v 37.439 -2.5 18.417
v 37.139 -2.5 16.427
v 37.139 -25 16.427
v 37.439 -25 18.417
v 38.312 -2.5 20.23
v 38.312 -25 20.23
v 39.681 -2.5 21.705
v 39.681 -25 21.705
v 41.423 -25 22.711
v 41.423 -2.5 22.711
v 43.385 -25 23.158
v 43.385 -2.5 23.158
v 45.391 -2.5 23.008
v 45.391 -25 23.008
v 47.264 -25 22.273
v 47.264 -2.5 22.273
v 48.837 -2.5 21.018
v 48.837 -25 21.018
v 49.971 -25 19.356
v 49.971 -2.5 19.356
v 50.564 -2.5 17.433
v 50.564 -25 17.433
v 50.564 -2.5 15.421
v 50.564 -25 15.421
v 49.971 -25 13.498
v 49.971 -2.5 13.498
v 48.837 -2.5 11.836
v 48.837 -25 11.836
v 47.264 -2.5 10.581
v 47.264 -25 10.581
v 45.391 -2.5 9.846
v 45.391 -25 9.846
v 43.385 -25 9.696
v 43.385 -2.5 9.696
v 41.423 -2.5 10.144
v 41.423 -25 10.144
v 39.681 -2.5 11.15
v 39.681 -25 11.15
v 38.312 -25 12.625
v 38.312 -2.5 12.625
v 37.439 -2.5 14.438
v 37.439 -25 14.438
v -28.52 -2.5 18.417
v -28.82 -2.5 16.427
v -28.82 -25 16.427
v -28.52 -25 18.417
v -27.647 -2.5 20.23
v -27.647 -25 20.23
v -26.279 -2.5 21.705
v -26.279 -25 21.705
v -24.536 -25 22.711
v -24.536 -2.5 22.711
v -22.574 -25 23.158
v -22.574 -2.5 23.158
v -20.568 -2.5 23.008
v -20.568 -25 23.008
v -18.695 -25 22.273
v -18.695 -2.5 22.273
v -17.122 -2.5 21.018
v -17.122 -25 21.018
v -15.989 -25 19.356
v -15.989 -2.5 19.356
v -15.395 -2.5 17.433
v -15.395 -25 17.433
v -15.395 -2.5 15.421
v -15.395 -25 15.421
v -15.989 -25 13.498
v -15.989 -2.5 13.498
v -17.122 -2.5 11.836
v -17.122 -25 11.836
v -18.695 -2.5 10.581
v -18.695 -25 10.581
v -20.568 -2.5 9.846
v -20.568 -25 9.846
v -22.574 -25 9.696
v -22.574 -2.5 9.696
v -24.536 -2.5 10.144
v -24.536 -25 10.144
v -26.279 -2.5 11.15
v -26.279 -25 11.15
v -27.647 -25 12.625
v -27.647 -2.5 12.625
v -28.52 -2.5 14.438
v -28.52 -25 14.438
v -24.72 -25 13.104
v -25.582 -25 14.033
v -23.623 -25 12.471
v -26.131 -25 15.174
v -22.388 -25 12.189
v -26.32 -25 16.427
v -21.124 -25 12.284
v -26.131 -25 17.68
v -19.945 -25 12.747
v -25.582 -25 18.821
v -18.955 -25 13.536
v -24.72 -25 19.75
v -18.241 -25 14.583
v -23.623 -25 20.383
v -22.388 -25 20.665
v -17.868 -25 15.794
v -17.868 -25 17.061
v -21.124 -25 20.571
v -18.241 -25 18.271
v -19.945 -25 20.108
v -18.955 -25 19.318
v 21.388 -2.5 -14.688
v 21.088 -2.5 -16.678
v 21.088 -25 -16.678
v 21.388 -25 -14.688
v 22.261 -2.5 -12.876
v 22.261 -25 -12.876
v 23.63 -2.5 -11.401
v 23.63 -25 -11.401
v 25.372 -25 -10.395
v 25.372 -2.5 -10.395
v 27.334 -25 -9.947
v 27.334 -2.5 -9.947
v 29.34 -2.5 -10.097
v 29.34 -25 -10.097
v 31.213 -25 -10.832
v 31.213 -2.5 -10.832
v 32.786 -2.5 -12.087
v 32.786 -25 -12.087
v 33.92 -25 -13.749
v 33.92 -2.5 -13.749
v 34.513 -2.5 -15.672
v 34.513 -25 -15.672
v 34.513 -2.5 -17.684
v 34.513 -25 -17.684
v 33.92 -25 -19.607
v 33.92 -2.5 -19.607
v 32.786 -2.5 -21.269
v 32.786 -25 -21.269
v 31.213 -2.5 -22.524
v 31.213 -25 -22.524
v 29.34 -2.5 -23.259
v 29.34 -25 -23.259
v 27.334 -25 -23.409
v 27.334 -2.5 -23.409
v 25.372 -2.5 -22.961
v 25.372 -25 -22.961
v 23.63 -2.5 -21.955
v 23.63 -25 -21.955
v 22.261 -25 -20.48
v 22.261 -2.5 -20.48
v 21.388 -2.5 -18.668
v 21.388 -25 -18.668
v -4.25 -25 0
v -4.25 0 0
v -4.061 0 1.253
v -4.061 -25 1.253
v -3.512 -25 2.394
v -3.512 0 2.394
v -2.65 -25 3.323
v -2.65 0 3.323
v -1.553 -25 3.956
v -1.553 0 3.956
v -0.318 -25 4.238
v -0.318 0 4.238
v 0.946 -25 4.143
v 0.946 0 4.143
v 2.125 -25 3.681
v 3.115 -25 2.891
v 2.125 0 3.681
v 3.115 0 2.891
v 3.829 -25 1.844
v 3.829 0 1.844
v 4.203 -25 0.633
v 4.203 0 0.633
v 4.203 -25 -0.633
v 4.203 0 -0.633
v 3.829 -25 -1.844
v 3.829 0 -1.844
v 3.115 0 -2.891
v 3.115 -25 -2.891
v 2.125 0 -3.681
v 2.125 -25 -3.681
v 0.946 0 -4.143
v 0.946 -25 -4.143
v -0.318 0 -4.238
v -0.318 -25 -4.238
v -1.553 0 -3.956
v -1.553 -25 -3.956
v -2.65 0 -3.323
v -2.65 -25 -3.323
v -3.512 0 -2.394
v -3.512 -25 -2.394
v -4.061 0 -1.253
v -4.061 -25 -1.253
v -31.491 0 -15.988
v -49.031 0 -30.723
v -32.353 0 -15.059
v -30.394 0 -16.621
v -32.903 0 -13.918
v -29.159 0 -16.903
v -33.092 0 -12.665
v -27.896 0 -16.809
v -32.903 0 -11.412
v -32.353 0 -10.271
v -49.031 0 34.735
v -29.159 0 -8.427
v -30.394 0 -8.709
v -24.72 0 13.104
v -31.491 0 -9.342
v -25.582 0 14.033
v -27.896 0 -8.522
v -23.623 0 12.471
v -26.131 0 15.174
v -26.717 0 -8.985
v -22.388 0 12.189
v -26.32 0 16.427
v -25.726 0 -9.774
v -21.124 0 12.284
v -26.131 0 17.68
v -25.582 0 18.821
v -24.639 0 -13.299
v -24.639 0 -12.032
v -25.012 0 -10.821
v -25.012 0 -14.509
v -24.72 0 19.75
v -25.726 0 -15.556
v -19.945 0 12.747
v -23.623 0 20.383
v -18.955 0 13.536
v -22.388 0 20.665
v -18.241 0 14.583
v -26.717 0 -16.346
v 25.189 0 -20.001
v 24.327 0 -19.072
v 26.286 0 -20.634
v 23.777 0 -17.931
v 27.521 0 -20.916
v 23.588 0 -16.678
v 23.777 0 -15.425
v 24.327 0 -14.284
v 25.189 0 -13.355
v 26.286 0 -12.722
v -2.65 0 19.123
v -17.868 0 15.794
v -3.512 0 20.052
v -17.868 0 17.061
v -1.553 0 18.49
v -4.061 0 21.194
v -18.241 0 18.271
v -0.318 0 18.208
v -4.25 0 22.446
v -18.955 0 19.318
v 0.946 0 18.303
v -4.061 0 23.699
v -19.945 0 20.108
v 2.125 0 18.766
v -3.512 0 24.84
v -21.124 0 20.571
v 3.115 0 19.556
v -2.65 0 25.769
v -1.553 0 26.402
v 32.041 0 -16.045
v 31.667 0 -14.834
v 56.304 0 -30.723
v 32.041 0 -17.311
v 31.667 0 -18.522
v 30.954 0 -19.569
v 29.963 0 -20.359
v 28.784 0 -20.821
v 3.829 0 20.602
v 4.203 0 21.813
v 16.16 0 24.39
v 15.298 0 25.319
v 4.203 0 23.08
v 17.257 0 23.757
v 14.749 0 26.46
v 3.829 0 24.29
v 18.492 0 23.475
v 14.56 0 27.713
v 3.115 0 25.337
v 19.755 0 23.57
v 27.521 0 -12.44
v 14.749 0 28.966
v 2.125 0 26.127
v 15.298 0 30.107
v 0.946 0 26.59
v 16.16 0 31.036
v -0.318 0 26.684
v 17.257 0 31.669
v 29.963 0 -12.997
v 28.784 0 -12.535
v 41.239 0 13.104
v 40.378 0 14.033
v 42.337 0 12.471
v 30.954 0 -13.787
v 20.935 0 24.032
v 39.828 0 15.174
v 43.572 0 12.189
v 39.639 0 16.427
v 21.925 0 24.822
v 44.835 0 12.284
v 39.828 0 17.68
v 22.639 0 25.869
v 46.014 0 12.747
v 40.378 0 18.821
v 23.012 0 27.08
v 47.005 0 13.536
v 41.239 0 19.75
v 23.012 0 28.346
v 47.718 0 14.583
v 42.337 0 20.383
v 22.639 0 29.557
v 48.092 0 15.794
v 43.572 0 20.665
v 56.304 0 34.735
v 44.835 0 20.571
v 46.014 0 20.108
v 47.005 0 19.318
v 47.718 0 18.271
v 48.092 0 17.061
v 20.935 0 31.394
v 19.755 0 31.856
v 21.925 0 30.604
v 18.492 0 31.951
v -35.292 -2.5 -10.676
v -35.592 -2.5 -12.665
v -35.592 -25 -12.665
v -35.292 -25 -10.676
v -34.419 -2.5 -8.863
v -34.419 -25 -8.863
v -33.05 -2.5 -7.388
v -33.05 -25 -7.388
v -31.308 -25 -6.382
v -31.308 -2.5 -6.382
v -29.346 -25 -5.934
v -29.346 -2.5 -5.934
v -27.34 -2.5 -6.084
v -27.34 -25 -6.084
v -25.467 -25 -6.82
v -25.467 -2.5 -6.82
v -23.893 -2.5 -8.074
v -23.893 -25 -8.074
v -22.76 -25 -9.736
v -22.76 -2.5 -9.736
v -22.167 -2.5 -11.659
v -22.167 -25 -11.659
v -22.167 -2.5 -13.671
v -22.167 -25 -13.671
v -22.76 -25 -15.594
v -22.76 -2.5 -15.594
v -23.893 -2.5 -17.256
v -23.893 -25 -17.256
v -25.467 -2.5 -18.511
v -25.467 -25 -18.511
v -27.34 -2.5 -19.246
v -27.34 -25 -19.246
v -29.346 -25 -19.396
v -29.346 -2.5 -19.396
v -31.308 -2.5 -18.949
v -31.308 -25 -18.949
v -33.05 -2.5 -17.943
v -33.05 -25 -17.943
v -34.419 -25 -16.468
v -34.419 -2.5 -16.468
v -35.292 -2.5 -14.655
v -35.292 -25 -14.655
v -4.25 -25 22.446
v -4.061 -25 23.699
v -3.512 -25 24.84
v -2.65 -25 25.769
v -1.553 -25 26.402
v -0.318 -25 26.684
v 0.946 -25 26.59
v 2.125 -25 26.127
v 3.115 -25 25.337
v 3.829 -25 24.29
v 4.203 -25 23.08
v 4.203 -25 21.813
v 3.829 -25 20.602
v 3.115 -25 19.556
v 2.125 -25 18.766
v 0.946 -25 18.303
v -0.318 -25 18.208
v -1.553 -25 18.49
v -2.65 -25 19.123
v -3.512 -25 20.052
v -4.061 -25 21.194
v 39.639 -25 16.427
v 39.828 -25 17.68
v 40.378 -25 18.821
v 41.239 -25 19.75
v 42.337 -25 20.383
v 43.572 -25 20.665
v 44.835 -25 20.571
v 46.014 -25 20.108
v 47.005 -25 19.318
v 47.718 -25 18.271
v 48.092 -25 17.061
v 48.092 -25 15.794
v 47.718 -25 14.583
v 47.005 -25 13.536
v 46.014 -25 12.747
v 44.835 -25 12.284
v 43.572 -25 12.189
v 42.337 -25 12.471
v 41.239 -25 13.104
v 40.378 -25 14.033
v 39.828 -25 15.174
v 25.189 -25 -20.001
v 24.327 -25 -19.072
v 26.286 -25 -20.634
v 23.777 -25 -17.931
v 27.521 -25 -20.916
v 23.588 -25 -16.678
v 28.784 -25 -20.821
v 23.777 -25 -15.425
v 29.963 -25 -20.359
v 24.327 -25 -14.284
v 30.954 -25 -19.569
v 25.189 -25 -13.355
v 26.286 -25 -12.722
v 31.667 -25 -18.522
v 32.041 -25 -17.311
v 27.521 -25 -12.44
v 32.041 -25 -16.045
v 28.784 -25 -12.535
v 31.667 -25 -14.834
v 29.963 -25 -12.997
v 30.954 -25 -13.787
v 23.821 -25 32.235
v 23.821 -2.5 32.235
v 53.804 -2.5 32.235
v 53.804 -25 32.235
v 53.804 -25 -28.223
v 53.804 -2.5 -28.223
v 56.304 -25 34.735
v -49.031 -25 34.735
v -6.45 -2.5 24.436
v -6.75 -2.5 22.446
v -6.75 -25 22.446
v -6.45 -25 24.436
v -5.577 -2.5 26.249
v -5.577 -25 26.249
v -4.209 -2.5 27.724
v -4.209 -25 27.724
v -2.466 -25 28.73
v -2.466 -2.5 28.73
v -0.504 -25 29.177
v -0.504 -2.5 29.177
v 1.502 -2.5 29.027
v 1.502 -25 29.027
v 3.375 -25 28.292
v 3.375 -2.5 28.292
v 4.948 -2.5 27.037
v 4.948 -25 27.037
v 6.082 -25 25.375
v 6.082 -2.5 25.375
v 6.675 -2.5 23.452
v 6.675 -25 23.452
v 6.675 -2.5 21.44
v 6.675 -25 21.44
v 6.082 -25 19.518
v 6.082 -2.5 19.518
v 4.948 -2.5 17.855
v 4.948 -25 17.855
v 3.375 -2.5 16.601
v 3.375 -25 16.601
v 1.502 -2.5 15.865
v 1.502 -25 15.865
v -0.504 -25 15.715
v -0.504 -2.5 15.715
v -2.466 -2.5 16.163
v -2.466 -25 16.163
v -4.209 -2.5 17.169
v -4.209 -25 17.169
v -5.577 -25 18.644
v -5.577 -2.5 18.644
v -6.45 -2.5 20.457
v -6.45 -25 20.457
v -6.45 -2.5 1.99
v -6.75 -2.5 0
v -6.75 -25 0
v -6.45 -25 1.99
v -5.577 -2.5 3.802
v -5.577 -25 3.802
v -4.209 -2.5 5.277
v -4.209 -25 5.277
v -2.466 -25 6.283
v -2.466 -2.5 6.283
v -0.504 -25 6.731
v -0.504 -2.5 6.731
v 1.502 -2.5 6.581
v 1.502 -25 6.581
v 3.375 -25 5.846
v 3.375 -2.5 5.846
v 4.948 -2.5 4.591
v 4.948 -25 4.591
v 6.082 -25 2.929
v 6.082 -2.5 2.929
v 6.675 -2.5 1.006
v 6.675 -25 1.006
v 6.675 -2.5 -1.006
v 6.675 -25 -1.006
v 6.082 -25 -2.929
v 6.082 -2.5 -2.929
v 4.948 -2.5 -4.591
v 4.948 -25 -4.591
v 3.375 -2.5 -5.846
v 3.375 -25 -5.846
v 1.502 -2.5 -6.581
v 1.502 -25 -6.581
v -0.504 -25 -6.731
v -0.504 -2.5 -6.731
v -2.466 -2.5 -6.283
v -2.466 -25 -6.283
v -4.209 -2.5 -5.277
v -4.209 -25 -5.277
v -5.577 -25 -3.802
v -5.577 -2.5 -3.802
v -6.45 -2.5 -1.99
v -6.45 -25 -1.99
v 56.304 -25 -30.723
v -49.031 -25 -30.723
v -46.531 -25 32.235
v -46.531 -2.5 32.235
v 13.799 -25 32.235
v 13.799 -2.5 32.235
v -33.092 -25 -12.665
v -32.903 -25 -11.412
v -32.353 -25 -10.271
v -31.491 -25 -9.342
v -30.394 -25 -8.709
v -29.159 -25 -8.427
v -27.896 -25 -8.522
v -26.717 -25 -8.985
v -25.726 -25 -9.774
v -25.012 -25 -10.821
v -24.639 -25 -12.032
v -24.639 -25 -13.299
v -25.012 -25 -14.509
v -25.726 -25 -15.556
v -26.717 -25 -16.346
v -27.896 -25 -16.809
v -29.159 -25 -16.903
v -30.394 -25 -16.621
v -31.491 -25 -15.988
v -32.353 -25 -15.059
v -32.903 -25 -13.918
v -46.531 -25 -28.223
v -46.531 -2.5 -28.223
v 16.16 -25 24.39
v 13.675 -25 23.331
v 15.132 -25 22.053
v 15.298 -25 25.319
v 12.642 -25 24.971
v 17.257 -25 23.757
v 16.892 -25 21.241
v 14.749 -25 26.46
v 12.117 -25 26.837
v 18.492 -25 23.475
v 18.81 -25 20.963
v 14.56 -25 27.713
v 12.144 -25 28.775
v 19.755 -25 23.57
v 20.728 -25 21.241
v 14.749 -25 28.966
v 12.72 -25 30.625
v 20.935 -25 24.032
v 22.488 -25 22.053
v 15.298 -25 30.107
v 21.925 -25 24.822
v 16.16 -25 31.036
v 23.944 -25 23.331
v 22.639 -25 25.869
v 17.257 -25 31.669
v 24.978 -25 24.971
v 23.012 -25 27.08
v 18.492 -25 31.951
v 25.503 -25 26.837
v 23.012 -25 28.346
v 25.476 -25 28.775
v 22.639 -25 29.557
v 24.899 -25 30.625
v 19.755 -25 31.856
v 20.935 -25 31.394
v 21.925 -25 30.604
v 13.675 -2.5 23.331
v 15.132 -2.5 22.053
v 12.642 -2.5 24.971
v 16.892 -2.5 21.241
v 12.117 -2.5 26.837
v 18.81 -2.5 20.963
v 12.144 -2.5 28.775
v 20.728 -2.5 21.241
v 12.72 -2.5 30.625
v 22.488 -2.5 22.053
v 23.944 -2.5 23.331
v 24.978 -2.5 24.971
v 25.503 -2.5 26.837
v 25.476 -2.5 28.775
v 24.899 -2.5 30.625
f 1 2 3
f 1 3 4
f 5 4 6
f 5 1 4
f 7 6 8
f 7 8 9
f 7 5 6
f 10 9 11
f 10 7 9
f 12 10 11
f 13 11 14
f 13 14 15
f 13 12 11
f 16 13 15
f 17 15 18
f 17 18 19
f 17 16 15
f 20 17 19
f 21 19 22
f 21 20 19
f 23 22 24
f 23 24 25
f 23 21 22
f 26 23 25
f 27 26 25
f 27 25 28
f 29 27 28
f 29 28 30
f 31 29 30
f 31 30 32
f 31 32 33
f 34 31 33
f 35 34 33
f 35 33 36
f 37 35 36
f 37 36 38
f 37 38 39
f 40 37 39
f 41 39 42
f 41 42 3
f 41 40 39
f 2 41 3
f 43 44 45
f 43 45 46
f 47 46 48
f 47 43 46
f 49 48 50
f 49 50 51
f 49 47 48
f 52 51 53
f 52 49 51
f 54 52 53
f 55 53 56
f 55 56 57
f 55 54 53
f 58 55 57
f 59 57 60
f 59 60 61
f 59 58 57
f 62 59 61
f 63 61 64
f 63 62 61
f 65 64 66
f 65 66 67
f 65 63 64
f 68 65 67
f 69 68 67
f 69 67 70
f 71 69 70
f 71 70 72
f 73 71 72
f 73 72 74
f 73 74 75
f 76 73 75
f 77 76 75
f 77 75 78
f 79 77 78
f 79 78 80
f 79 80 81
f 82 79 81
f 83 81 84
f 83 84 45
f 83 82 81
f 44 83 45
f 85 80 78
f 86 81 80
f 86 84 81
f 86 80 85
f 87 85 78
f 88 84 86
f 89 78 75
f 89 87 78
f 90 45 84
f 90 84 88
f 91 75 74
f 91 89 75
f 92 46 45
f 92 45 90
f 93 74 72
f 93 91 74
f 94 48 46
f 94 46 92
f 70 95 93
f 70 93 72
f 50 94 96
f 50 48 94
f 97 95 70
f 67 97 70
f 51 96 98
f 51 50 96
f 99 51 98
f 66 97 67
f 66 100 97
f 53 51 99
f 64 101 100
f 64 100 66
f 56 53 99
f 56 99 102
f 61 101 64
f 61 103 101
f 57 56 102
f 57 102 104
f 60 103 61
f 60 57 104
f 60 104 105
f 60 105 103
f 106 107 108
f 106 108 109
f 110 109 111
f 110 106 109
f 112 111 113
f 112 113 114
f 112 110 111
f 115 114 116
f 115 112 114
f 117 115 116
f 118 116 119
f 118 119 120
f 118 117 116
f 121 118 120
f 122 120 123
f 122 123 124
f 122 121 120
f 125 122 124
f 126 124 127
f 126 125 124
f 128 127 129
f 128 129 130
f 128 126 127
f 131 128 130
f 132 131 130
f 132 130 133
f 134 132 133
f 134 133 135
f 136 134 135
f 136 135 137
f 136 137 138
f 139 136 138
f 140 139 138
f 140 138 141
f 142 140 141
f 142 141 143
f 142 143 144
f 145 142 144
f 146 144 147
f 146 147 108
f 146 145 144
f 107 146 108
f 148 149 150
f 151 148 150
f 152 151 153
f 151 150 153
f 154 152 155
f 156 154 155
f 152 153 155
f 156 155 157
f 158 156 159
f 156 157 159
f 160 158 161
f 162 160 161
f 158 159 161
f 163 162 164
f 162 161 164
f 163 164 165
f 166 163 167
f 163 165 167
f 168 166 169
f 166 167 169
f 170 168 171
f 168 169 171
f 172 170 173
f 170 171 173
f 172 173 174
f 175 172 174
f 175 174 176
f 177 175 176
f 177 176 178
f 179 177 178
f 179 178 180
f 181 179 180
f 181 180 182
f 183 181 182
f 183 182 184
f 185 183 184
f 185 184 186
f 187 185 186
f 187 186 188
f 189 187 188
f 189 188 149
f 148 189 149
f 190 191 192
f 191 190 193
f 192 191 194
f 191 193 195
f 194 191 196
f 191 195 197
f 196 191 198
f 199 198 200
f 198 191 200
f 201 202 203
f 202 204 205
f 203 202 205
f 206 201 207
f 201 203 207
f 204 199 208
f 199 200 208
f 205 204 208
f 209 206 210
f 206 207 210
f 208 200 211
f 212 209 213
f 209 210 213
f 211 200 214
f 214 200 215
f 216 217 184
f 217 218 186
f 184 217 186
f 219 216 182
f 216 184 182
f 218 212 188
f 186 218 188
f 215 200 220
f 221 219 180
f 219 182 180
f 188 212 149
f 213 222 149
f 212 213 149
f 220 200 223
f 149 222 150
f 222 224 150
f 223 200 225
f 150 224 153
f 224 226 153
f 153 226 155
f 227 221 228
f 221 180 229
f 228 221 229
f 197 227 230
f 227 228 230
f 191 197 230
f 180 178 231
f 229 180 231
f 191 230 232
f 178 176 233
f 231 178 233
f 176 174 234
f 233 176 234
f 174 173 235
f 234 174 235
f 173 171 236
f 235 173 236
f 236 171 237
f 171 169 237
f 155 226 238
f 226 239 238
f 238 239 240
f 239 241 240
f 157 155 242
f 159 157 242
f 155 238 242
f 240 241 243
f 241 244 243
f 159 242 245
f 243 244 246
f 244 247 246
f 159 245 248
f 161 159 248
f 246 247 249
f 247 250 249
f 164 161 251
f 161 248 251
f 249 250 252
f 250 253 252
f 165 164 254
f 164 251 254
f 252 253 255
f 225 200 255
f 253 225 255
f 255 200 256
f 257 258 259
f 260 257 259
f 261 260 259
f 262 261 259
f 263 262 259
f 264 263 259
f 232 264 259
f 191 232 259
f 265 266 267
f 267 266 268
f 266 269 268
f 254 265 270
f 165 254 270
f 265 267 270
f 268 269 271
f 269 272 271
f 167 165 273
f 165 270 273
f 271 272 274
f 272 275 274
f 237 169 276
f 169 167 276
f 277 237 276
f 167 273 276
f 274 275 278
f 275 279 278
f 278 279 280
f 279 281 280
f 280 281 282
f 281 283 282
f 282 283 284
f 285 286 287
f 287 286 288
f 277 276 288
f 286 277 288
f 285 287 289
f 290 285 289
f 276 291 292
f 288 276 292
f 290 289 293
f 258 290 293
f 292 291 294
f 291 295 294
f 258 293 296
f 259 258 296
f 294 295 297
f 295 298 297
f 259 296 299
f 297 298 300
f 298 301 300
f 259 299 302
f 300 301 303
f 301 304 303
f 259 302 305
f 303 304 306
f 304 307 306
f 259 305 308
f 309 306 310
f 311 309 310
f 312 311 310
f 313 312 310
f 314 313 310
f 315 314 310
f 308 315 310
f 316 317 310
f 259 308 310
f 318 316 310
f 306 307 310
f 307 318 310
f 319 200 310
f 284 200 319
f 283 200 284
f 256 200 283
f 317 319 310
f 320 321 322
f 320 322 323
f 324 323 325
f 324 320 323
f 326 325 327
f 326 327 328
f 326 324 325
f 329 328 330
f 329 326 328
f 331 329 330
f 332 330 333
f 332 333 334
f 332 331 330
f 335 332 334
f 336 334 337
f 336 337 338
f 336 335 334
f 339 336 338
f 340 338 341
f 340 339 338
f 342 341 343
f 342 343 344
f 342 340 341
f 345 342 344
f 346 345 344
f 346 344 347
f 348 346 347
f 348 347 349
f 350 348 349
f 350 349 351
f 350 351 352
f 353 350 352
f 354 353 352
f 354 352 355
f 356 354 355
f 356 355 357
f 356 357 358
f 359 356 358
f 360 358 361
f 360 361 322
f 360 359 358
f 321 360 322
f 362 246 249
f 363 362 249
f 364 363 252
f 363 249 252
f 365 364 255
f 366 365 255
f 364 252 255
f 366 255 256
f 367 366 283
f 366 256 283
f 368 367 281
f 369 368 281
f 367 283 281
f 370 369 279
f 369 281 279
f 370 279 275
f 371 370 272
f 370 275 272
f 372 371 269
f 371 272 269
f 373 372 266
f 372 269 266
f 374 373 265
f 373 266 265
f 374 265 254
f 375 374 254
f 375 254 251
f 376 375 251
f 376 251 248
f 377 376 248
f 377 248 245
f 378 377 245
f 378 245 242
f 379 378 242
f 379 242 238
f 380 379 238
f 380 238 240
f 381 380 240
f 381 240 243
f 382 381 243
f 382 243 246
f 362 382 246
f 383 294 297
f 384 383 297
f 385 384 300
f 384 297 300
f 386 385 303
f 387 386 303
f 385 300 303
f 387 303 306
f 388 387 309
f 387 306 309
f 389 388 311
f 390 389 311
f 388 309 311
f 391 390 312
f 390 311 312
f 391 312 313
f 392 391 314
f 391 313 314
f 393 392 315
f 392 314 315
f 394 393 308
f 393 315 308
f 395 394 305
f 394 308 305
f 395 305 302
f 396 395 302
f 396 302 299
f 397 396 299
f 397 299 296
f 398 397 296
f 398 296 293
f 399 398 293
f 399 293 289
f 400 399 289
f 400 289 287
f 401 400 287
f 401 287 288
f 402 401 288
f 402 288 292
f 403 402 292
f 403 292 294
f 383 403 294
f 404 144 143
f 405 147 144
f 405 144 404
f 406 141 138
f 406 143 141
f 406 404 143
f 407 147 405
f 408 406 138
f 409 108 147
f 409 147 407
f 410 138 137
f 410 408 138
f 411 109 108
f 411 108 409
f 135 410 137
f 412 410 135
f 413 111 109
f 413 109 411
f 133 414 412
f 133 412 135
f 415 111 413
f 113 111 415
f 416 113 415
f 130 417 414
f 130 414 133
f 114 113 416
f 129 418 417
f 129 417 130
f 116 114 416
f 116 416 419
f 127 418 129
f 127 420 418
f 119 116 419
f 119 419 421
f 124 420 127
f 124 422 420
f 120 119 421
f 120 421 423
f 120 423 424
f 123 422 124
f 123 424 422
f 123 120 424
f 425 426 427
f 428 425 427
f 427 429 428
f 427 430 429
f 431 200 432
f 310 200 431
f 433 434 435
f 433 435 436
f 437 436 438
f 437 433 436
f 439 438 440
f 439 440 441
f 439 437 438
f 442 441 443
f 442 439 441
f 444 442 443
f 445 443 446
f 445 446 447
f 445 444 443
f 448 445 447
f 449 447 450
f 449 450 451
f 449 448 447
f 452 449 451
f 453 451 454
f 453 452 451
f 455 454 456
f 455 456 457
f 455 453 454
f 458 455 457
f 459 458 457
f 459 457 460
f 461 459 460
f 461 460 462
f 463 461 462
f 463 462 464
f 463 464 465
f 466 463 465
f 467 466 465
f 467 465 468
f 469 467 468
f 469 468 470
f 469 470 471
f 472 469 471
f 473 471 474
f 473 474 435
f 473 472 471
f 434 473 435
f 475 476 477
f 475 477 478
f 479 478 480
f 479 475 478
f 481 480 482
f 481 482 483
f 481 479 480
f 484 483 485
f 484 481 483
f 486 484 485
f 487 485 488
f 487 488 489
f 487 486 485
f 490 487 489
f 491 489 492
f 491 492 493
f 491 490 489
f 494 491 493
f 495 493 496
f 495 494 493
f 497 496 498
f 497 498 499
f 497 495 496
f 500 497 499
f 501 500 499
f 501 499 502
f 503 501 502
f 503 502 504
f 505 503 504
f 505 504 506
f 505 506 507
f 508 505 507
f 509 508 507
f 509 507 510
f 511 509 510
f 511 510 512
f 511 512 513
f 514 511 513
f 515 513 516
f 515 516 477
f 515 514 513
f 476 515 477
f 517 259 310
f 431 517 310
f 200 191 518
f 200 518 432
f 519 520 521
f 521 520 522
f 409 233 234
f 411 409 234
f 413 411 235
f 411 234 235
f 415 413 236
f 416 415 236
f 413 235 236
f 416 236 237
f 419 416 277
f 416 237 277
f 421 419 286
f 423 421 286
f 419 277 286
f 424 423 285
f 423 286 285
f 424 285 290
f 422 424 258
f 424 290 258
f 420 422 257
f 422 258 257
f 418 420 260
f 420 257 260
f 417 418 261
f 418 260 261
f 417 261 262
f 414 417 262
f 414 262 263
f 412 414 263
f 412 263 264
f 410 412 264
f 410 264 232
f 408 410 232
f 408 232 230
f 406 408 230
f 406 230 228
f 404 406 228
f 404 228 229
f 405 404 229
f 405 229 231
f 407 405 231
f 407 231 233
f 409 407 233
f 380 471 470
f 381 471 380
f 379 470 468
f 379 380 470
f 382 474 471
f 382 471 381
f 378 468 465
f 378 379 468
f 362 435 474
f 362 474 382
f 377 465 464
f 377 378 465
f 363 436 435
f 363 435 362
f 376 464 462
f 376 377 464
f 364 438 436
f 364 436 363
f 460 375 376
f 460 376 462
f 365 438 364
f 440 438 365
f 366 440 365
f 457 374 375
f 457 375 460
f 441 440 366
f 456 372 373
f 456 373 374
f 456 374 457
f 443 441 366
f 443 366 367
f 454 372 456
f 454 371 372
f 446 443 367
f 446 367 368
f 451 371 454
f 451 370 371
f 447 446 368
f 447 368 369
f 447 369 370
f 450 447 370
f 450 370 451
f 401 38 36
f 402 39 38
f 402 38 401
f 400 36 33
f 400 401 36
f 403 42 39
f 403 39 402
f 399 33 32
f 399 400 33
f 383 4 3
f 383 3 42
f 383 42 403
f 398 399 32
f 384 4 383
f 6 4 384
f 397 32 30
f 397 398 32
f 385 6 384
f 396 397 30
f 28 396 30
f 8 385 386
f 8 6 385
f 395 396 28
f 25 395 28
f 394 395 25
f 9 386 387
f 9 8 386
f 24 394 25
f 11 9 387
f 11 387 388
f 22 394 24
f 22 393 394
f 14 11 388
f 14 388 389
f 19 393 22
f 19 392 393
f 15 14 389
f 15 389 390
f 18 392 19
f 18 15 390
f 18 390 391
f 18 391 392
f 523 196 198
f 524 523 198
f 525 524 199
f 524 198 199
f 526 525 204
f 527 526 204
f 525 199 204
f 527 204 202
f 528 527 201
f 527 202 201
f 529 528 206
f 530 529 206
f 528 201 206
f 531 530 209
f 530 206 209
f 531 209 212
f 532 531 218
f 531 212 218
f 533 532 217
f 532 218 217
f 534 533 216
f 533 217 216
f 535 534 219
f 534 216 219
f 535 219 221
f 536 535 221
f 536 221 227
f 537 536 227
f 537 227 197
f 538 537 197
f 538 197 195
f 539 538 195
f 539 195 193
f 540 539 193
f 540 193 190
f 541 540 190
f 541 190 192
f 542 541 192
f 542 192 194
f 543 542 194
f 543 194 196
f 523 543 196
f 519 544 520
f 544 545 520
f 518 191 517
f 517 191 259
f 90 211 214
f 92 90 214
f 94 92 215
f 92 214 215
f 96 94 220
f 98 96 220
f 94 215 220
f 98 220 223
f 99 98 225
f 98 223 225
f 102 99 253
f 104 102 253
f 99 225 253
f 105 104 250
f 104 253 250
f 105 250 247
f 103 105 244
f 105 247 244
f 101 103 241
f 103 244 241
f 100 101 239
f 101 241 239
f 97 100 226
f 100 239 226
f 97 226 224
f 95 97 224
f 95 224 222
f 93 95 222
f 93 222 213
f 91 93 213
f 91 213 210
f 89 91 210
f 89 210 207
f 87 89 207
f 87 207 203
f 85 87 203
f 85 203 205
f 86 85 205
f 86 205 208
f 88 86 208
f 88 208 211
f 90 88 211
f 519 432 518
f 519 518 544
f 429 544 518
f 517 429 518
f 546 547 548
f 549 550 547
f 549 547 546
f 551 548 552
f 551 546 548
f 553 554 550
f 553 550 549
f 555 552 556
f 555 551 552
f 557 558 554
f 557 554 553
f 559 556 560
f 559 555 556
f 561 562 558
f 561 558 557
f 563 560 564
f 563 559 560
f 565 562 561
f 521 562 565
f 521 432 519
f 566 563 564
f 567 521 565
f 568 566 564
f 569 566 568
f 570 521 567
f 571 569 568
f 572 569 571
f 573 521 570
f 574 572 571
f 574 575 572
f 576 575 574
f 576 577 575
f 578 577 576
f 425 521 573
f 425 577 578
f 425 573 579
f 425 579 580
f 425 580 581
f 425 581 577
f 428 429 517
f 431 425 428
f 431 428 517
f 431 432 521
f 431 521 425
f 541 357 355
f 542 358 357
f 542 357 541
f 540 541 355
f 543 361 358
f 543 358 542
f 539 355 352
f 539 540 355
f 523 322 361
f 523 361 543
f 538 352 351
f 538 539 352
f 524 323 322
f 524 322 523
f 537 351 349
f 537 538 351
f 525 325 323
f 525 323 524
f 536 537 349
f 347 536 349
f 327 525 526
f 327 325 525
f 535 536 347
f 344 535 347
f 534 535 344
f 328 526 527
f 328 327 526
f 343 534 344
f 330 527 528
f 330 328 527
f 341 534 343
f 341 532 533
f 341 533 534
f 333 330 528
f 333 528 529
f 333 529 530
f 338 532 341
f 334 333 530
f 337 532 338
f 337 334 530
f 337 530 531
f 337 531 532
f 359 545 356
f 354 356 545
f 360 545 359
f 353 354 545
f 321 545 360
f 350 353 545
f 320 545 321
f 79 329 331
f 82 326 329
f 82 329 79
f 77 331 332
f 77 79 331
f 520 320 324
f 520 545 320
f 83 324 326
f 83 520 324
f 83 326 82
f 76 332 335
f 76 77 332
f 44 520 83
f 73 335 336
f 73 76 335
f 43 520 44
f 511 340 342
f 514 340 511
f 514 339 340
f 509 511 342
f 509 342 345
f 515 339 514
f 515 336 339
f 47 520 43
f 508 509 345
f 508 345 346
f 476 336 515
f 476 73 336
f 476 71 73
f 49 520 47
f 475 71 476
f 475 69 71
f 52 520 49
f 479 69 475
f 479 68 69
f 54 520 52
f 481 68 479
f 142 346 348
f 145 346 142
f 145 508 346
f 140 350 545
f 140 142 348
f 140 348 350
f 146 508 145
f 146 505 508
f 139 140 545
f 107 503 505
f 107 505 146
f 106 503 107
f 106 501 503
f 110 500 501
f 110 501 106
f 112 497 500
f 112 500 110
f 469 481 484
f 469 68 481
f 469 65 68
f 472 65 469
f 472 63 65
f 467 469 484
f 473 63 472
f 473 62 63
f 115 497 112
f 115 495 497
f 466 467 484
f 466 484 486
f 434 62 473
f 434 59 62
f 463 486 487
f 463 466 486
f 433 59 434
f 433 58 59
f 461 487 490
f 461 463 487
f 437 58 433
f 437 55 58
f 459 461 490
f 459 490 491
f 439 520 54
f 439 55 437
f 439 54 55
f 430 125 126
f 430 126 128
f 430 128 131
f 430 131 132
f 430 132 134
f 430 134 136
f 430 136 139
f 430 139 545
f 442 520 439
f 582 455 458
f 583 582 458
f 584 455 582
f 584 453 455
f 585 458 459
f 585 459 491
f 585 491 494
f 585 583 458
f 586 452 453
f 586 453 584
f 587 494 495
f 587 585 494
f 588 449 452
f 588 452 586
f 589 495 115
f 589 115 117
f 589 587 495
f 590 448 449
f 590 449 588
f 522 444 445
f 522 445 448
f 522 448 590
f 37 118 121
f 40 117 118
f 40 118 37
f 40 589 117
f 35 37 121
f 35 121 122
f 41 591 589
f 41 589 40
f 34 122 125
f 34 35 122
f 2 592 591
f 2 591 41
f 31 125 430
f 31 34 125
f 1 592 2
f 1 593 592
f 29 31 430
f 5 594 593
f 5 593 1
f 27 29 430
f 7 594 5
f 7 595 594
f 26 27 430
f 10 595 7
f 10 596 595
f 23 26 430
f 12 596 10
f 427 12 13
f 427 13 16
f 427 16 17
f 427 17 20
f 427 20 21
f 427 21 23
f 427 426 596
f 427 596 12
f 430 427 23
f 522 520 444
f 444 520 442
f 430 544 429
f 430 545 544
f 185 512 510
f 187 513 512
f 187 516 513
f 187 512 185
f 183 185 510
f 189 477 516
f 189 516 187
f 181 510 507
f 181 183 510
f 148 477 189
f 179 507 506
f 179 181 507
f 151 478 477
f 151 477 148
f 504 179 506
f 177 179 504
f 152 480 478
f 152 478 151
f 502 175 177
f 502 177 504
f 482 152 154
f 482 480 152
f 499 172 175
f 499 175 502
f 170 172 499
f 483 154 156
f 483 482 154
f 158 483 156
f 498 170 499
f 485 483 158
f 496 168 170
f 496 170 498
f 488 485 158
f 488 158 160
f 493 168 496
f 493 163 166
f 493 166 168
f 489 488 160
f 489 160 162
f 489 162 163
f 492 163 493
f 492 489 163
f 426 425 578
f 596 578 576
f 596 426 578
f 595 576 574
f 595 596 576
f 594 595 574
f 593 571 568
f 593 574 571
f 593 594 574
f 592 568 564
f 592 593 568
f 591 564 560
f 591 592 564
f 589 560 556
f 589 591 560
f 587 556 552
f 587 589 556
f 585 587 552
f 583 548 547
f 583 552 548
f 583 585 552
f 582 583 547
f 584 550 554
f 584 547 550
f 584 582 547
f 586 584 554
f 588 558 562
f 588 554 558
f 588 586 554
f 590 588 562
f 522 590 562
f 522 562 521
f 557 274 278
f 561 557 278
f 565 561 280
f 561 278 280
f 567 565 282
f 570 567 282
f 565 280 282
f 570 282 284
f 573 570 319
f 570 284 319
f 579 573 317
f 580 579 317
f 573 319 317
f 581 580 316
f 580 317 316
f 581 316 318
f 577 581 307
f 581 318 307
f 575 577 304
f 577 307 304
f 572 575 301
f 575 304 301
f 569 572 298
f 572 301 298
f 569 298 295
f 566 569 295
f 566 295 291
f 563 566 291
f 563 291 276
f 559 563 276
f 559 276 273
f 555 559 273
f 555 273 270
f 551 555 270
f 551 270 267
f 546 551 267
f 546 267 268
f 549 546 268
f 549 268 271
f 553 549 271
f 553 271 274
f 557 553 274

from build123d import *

# Parameters (mm, degrees)
F0_W     = 105.3343974054
F0_H     = 65.4578059912
F1_DEPTH = 25
F3_D     = 8.5
F4_T     = -2.5


with BuildPart() as f1:
    # F0 (on Front) → F1 (new body)
    with BuildSketch(Plane.XZ):
        with Locations((3.6365445703, 2.0063705742)):
            Rectangle(F0_W, F0_H)
    extrude(amount=F1_DEPTH)

    # F3 (through all)
    with Locations(Plane.XZ.offset(25)):
        with Locations((-22.0700632781, 16.4271499962), (0, 22.4462598562), (18.8097134233, 27.7129784226), (43.8893288374, 16.4271499962), (-28.8415607065, -12.6652074978), (0, 0), (27.838377282, -16.6779458523)):
            Hole(F3_D / 2)

    # F4
    f4_openings = [f1.faces().sort_by_distance(p)[0] for p in [
        (-47.79049, -25, 2.006371),
    ]]
    offset(amount=F4_T, openings=f4_openings)


solid = f1.part
